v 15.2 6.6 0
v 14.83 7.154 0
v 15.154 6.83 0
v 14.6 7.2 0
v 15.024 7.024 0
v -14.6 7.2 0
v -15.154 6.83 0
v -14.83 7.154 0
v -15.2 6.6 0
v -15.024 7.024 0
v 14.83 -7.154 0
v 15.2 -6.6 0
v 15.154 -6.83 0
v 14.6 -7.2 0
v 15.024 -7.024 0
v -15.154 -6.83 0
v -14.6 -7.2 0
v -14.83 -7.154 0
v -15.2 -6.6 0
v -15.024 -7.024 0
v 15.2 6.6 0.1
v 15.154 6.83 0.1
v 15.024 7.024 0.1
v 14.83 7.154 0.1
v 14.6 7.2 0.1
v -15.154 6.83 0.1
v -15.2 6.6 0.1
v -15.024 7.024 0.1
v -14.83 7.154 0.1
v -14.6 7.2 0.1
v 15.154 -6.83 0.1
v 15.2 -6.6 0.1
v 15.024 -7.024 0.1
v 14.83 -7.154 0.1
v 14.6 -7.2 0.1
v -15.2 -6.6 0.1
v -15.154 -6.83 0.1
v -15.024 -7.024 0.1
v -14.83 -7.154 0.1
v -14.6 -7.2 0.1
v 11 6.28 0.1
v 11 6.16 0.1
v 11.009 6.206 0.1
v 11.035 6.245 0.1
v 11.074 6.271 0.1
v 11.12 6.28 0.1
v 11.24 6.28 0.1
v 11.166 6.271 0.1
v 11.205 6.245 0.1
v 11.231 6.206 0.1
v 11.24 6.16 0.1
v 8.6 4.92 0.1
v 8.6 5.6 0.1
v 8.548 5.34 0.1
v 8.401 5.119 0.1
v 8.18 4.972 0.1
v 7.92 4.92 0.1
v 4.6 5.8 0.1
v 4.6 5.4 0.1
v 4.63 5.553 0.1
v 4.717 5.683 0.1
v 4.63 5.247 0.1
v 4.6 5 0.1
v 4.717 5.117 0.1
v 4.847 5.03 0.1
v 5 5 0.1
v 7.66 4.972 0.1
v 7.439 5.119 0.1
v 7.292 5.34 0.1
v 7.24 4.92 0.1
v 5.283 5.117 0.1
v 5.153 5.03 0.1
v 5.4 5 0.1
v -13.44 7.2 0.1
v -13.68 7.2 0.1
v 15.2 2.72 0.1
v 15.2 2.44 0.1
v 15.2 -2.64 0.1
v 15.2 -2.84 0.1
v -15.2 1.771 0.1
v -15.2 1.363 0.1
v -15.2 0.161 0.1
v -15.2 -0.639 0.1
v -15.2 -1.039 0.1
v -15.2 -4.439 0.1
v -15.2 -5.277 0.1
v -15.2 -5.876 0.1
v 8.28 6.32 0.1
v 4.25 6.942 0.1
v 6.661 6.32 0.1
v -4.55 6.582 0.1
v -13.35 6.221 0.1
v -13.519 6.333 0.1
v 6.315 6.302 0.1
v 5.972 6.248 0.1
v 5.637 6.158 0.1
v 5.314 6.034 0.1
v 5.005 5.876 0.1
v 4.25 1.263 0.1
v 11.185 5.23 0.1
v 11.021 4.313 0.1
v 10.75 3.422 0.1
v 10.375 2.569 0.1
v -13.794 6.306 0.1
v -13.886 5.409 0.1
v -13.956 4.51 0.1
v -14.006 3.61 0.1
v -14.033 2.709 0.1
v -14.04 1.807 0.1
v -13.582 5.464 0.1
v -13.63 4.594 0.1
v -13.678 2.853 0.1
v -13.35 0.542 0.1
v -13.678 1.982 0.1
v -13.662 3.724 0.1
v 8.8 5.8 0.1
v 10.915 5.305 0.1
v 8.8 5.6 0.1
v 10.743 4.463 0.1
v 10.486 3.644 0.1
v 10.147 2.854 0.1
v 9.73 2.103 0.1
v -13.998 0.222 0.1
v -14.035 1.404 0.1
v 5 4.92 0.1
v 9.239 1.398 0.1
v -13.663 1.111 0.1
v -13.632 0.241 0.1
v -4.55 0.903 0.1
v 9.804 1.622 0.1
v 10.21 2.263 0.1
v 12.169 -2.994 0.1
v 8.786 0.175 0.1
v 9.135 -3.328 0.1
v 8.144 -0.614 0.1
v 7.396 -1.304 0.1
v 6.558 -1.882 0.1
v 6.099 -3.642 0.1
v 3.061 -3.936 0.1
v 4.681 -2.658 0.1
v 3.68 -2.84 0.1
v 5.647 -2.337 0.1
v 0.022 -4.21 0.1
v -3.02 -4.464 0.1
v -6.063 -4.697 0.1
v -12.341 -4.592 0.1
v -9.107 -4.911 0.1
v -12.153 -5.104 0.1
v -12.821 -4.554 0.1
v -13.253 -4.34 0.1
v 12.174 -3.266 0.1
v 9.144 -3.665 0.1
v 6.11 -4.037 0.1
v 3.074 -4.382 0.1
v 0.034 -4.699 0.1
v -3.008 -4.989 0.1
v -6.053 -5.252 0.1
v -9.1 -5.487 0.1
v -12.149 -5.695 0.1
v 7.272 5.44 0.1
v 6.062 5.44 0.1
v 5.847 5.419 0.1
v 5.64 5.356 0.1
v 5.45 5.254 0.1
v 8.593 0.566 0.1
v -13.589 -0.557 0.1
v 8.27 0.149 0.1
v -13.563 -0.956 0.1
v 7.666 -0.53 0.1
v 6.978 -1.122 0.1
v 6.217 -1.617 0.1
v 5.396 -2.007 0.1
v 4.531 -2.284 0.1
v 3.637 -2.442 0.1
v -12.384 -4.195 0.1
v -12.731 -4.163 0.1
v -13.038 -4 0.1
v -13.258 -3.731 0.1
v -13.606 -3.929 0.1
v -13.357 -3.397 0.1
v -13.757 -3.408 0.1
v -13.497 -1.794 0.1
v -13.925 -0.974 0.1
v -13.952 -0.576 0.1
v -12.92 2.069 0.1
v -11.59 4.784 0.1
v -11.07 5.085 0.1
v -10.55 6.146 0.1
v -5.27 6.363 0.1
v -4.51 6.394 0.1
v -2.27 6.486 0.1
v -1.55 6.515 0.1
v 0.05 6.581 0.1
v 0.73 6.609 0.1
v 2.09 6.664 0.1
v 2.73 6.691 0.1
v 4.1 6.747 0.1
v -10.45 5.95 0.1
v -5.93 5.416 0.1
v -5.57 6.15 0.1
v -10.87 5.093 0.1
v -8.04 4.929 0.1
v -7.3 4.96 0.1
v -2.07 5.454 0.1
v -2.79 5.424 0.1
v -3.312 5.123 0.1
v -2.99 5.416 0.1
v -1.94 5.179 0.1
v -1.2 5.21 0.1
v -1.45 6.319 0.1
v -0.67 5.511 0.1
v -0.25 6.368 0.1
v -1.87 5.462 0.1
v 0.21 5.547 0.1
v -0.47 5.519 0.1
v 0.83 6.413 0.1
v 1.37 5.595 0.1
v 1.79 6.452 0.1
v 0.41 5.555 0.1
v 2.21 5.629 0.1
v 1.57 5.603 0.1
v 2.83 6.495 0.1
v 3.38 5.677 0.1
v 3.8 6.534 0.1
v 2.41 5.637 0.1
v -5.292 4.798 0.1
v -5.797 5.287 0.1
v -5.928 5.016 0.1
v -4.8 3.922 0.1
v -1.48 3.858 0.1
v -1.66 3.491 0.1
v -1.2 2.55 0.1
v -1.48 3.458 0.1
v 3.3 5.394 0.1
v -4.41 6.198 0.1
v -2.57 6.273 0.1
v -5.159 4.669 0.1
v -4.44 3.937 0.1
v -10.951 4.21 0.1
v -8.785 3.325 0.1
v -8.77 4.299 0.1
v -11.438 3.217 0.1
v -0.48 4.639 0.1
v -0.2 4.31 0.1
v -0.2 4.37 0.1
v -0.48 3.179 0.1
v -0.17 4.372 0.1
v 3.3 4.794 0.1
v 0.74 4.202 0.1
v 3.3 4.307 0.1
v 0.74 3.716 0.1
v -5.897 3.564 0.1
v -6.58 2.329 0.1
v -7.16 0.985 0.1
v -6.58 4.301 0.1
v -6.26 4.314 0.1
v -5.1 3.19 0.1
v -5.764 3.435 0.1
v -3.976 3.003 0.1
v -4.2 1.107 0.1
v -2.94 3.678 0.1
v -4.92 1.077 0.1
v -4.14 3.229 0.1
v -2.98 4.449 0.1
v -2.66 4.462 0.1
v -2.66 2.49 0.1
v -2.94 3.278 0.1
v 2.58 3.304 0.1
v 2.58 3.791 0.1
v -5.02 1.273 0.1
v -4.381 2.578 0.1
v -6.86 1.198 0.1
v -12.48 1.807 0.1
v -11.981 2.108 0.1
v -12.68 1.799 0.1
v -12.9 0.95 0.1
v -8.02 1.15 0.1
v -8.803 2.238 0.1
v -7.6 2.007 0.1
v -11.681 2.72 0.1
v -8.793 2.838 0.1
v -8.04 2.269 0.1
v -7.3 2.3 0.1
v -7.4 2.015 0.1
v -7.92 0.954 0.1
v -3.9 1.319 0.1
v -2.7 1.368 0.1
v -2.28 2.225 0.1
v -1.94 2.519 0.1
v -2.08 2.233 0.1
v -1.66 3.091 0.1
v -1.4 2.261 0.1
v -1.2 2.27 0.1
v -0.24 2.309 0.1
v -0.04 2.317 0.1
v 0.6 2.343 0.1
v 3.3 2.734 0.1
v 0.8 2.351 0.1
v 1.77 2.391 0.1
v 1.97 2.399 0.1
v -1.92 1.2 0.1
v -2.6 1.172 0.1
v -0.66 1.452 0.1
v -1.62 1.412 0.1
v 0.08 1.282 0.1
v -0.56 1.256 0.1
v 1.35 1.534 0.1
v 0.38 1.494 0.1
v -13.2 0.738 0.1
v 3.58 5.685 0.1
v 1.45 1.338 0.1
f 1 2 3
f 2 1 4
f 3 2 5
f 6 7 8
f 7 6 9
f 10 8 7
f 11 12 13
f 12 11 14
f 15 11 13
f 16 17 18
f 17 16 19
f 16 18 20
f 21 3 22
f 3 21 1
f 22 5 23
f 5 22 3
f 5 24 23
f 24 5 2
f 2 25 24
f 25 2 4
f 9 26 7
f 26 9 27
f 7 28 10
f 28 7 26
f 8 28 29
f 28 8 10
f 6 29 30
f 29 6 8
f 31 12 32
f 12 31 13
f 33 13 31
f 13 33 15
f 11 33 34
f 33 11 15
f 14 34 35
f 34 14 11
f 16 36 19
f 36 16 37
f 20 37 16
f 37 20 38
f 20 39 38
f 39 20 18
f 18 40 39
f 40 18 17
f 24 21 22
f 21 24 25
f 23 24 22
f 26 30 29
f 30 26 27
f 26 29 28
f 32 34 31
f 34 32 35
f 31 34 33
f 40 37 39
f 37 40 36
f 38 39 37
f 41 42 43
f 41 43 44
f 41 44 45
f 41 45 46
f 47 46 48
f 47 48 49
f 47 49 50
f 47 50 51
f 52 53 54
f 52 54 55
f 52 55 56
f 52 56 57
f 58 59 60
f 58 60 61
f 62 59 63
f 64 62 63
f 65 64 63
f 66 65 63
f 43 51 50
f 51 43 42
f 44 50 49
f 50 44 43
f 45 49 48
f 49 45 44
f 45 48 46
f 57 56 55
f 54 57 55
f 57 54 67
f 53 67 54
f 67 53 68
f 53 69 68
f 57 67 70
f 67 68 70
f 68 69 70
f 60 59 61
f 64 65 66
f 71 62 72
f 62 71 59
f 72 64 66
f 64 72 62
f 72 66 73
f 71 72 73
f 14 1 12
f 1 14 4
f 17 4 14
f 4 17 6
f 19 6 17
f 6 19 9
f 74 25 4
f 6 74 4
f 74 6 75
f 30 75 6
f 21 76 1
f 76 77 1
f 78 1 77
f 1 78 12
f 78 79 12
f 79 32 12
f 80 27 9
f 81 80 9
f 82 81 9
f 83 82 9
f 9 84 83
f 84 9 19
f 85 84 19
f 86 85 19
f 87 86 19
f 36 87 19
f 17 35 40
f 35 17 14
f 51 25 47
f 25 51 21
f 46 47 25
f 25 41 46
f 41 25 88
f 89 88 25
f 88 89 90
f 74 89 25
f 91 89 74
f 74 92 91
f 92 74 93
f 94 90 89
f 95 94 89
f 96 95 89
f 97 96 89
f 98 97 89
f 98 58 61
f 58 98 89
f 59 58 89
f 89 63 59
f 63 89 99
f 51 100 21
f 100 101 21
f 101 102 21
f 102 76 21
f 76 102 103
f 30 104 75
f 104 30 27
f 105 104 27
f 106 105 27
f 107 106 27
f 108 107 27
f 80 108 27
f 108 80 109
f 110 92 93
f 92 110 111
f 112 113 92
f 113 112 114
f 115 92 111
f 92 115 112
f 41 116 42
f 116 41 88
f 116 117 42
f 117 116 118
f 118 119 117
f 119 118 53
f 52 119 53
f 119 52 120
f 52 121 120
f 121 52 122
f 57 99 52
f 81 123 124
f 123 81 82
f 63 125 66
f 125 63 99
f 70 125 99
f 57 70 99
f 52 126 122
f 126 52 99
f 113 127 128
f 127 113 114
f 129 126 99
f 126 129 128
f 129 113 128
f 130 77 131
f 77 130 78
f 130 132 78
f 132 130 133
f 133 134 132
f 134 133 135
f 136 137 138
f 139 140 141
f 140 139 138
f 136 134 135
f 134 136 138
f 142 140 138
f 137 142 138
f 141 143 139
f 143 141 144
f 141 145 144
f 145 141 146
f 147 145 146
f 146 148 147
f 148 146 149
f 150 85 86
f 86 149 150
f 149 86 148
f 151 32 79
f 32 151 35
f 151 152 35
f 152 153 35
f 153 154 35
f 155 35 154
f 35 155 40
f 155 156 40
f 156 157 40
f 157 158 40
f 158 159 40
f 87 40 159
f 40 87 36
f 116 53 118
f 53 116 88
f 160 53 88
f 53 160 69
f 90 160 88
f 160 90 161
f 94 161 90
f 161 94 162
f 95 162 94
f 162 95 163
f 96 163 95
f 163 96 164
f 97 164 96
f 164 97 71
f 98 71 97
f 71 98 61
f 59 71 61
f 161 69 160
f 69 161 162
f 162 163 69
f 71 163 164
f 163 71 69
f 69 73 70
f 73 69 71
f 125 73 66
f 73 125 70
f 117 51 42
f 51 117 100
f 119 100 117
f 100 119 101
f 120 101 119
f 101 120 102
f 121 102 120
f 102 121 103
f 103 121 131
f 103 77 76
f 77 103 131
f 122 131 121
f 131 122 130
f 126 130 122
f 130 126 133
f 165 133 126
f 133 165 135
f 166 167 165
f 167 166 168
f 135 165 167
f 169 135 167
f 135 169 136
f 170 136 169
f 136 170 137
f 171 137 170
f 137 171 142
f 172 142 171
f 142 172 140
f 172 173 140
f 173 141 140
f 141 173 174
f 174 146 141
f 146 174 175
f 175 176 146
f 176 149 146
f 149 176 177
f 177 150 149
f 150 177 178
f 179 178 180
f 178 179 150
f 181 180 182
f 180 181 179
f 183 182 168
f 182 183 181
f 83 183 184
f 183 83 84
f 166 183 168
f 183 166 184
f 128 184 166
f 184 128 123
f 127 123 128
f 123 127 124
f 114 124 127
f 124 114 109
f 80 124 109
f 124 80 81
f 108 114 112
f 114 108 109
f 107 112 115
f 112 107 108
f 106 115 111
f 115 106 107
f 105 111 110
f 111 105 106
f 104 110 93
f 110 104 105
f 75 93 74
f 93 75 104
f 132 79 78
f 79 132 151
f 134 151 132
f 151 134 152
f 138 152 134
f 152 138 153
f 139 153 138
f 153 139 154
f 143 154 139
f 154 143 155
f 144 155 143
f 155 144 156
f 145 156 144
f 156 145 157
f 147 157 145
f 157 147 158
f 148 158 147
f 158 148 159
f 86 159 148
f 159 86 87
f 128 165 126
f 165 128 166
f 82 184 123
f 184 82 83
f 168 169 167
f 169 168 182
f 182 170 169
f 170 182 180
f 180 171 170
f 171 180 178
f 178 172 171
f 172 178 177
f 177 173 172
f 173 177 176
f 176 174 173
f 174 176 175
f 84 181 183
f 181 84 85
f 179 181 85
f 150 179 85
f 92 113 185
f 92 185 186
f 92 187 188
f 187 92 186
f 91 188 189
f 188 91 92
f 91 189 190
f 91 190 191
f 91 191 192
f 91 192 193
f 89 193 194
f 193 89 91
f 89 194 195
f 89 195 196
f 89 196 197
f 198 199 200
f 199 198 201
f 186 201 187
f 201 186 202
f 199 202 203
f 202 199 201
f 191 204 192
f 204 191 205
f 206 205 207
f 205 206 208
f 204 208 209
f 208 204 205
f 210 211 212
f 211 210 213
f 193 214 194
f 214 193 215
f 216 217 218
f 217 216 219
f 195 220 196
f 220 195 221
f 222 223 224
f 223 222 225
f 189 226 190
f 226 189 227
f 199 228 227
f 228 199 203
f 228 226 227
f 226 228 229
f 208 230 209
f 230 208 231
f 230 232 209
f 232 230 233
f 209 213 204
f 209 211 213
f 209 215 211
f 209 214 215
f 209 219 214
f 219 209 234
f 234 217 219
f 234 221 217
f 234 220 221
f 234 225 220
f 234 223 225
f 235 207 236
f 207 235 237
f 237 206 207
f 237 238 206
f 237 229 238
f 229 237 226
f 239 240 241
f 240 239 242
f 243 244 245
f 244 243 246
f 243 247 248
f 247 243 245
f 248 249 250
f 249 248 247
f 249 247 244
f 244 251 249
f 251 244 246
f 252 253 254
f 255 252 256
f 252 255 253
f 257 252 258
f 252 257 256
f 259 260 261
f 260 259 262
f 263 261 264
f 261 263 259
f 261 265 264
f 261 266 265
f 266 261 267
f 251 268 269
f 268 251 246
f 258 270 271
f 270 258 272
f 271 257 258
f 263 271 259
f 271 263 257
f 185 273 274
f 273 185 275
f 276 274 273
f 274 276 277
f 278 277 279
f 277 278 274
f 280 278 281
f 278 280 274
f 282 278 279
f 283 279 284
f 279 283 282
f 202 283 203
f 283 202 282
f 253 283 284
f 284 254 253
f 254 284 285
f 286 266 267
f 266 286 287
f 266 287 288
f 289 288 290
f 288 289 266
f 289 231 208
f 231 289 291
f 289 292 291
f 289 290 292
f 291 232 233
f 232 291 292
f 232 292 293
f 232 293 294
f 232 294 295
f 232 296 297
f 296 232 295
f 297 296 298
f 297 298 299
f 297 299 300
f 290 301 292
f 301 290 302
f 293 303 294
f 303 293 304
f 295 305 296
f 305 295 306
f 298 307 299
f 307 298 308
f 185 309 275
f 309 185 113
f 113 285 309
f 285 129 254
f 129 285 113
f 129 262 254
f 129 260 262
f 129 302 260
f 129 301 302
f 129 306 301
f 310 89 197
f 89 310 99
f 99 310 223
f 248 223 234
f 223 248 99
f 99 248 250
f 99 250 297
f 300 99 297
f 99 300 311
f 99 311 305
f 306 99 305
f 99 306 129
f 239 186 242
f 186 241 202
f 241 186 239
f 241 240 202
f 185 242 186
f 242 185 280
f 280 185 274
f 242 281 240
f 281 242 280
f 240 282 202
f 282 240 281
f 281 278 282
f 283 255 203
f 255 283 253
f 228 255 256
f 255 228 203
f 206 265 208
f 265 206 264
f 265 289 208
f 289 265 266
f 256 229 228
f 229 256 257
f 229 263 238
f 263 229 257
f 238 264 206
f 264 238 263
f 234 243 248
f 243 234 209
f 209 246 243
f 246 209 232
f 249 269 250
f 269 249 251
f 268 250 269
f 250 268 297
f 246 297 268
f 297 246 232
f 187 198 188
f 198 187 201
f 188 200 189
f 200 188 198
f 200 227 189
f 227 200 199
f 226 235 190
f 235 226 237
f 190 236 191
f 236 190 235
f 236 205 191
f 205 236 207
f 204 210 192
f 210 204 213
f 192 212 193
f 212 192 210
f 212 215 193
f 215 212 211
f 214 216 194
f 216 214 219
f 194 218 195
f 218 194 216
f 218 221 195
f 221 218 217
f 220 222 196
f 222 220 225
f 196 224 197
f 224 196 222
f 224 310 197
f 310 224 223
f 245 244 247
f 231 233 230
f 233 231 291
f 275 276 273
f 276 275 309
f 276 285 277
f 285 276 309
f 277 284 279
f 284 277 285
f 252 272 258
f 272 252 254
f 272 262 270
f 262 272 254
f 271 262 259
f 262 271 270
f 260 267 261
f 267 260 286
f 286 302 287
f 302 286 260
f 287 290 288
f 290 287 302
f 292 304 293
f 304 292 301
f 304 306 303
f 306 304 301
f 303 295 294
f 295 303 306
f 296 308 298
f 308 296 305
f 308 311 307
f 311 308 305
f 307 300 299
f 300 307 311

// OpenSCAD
use <../lib.scad>
use <s/6177741js01.scad>
use <s/6177741js02.scad>
function ldraw_lib__6177741m() = [
// 0 Sticker  1.8 x  3.8 with Door Outline with Yellow Stripes and White AMG Logo on Transparent Background Left
// 0 Name: 6177741m.dat
// 0 Author: Massimo Maso [Sirio]
// 0 !LDRAW_ORG Part UPDATE 2025-05
// 0 !LICENSE Licensed under CC BY 4.0 : see CAreadme.txt
// 
// 0 BFC CERTIFY CCW
  [0,"BFC","CERTIFY"],
  [0,"BFC","CCW"],
// 
// 0 !KEYWORDS GT3, Mercedes, Set 75877, Speed Champions
// 
// 0 !HISTORY 2025-05-28 [OrionP] Official Update 2025-05
// 
// 
// 1 16 0 0 0 -1 0 0 0 1 0 0 0 1 s\6177741js01.dat
  [1,16,0,0,0,-1,0,0,0,1,0,0,0,1, ldraw_lib__s__6177741js01()],
// 1 16 -11.3750 -.25 9.3556 1 0 0 0 1 0 0.040976 0 1 s\6177741js02.dat
  [1,16,-11.3750,-.25,9.3556,1,0,0,0,1,0,0.040976,0,1, ldraw_lib__s__6177741js02()],
];
module ldraw_lib__6177741m(step=0, col=false, unit=2/5, alt=false, line=0.2, solid=!$preview)
    makepoly(ldraw_lib__6177741m(), step=step, col=col, unit=unit, alt=alt, line=line, solid=solid);
ldraw_lib__6177741m(line=0.2);
